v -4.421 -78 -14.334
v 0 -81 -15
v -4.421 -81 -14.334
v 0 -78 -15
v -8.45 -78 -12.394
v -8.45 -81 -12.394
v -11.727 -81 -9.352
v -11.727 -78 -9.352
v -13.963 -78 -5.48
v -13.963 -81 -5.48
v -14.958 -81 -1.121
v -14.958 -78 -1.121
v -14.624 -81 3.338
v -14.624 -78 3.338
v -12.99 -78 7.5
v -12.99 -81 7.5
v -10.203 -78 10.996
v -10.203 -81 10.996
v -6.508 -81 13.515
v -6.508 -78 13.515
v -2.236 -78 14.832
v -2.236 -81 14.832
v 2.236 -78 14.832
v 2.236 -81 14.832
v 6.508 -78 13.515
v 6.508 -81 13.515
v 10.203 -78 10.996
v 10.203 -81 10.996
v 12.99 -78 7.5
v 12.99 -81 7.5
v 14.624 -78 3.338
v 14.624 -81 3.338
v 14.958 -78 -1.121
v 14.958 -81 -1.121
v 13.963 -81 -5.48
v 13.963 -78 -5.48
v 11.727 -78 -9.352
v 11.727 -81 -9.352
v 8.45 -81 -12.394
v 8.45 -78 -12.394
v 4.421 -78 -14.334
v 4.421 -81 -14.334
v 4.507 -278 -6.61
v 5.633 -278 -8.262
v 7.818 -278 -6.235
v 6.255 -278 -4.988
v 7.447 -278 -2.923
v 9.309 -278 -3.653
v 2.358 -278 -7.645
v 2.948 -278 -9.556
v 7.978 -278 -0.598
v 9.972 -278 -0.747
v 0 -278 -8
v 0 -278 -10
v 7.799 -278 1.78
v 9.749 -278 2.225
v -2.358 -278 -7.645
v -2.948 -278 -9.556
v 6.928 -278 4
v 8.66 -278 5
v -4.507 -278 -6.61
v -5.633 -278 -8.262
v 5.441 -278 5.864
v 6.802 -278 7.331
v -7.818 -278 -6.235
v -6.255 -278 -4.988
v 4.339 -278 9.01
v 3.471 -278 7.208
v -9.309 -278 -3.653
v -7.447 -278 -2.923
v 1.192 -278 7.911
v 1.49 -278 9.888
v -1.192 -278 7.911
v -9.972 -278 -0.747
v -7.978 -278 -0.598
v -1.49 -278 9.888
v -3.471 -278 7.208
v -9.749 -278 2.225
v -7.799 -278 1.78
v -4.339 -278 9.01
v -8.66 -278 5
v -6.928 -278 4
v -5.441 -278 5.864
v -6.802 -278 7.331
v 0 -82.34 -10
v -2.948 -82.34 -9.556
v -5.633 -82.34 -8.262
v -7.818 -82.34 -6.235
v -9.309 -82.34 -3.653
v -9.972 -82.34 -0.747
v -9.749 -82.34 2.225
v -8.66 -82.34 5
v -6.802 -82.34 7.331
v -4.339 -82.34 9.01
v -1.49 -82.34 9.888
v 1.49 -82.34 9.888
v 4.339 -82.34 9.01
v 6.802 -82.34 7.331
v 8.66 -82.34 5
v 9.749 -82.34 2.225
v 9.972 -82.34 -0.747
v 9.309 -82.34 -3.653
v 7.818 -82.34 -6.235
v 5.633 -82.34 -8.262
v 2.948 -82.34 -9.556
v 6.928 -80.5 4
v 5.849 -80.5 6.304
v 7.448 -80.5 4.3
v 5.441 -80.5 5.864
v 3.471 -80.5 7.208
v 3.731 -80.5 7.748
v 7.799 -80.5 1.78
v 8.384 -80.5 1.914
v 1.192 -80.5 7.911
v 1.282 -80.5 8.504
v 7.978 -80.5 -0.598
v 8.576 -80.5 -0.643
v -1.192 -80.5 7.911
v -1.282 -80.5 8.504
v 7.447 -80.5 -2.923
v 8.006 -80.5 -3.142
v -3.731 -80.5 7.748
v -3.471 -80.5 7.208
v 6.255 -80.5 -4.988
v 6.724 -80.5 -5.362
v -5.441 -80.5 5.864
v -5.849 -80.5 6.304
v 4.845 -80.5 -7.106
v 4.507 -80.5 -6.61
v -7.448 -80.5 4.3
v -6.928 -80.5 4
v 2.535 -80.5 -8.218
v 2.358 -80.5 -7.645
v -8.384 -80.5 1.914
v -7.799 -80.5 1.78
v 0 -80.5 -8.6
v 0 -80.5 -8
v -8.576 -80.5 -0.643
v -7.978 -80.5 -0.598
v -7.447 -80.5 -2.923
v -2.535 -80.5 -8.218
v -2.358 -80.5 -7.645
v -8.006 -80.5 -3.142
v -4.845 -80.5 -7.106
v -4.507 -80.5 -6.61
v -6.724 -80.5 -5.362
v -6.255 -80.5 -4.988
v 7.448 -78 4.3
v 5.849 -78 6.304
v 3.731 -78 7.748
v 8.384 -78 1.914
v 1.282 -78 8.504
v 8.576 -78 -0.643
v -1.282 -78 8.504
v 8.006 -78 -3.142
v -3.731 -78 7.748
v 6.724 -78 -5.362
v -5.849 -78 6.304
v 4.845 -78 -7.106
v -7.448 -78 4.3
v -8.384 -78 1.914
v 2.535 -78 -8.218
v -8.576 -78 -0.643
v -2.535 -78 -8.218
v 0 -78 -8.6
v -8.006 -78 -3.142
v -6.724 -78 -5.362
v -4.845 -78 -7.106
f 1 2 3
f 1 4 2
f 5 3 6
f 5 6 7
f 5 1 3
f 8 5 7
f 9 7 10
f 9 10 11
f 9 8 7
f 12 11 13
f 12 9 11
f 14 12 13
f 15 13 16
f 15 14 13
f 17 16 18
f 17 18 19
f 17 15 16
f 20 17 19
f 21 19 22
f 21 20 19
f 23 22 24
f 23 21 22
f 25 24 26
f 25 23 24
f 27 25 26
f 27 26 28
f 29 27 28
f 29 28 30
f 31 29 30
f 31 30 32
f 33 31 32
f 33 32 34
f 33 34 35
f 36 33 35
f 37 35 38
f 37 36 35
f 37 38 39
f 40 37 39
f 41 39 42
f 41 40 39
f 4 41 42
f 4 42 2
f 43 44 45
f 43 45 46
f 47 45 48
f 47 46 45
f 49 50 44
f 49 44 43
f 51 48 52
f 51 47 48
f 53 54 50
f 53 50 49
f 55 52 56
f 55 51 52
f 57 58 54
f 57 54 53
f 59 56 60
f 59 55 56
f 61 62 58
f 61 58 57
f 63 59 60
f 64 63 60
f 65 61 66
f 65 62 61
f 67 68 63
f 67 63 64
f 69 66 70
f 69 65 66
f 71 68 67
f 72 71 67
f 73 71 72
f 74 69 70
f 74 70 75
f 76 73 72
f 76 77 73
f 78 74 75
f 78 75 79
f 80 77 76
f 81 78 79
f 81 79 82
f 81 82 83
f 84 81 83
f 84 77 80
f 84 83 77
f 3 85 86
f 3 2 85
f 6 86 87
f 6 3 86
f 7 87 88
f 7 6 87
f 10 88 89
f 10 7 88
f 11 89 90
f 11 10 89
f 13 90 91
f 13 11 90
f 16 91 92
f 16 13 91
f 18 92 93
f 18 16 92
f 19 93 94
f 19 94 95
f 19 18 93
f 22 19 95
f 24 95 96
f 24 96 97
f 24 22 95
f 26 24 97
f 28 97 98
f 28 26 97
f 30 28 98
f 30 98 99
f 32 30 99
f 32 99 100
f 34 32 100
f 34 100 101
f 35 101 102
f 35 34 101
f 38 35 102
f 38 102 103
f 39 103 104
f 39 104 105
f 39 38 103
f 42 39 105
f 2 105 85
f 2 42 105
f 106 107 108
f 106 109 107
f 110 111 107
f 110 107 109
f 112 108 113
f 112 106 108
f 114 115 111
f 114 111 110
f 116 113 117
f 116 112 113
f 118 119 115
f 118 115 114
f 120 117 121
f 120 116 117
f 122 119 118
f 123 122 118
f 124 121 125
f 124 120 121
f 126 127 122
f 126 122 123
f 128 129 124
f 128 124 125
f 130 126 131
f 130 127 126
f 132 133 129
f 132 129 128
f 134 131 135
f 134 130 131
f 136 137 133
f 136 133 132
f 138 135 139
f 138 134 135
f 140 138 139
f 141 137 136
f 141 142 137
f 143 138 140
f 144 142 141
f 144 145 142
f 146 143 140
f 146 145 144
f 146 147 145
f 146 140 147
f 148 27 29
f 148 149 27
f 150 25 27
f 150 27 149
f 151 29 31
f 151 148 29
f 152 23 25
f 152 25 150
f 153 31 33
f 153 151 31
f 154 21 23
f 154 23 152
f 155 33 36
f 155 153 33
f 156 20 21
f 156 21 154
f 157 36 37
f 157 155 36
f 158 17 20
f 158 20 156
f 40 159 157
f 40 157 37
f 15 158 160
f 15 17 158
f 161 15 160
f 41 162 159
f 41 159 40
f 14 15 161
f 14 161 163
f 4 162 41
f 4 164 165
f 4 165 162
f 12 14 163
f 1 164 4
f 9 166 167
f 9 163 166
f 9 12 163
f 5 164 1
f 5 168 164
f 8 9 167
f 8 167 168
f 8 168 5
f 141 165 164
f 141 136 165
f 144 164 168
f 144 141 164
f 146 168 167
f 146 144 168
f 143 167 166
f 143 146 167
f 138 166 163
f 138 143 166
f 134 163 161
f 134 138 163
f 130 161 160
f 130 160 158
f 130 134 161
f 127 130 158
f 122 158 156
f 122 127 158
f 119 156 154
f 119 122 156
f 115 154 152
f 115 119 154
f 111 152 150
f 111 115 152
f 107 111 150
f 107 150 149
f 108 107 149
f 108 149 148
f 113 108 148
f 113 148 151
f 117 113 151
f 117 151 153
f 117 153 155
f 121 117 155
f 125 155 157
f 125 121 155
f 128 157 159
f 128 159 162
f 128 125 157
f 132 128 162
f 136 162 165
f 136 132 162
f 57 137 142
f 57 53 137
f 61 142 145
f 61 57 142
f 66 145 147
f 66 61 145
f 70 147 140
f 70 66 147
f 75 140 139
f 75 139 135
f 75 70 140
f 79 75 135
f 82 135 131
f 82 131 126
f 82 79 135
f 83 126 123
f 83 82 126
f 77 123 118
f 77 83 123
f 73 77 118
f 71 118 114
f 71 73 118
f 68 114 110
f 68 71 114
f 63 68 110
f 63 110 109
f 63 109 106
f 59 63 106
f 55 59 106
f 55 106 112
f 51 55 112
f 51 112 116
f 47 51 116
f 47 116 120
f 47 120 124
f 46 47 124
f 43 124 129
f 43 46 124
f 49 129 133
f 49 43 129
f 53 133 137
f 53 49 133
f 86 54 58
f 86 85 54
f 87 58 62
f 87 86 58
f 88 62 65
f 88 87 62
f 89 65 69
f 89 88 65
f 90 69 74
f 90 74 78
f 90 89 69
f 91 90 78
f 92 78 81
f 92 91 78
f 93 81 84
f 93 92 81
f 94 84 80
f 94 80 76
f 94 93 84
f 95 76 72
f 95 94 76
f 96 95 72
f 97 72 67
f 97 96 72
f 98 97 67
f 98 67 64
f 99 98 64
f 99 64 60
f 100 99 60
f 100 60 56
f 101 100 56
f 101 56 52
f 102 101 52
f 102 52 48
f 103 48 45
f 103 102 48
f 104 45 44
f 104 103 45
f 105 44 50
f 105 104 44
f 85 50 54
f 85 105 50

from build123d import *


with BuildPart() as part:
    # Reconstructed nominal axial profile → Native revolved geometry (revolve)
    with BuildSketch(Plane.XY, mode=Mode.PRIVATE) as native_revolved_geometry_sk:
        Polygon((8.6, -78), (8.6, -80.5), (8, -80.5), (8, -278), (10, -278), (10, -82.339745962), (15, -81), (15, -78), align=None)
    revolve(native_revolved_geometry_sk.sketch.rotate(Axis((0, -500, 0), (0, 1, 0)), 90), axis=Axis((0, -500, 0), (0, 1, 0)))


solid = part.part
